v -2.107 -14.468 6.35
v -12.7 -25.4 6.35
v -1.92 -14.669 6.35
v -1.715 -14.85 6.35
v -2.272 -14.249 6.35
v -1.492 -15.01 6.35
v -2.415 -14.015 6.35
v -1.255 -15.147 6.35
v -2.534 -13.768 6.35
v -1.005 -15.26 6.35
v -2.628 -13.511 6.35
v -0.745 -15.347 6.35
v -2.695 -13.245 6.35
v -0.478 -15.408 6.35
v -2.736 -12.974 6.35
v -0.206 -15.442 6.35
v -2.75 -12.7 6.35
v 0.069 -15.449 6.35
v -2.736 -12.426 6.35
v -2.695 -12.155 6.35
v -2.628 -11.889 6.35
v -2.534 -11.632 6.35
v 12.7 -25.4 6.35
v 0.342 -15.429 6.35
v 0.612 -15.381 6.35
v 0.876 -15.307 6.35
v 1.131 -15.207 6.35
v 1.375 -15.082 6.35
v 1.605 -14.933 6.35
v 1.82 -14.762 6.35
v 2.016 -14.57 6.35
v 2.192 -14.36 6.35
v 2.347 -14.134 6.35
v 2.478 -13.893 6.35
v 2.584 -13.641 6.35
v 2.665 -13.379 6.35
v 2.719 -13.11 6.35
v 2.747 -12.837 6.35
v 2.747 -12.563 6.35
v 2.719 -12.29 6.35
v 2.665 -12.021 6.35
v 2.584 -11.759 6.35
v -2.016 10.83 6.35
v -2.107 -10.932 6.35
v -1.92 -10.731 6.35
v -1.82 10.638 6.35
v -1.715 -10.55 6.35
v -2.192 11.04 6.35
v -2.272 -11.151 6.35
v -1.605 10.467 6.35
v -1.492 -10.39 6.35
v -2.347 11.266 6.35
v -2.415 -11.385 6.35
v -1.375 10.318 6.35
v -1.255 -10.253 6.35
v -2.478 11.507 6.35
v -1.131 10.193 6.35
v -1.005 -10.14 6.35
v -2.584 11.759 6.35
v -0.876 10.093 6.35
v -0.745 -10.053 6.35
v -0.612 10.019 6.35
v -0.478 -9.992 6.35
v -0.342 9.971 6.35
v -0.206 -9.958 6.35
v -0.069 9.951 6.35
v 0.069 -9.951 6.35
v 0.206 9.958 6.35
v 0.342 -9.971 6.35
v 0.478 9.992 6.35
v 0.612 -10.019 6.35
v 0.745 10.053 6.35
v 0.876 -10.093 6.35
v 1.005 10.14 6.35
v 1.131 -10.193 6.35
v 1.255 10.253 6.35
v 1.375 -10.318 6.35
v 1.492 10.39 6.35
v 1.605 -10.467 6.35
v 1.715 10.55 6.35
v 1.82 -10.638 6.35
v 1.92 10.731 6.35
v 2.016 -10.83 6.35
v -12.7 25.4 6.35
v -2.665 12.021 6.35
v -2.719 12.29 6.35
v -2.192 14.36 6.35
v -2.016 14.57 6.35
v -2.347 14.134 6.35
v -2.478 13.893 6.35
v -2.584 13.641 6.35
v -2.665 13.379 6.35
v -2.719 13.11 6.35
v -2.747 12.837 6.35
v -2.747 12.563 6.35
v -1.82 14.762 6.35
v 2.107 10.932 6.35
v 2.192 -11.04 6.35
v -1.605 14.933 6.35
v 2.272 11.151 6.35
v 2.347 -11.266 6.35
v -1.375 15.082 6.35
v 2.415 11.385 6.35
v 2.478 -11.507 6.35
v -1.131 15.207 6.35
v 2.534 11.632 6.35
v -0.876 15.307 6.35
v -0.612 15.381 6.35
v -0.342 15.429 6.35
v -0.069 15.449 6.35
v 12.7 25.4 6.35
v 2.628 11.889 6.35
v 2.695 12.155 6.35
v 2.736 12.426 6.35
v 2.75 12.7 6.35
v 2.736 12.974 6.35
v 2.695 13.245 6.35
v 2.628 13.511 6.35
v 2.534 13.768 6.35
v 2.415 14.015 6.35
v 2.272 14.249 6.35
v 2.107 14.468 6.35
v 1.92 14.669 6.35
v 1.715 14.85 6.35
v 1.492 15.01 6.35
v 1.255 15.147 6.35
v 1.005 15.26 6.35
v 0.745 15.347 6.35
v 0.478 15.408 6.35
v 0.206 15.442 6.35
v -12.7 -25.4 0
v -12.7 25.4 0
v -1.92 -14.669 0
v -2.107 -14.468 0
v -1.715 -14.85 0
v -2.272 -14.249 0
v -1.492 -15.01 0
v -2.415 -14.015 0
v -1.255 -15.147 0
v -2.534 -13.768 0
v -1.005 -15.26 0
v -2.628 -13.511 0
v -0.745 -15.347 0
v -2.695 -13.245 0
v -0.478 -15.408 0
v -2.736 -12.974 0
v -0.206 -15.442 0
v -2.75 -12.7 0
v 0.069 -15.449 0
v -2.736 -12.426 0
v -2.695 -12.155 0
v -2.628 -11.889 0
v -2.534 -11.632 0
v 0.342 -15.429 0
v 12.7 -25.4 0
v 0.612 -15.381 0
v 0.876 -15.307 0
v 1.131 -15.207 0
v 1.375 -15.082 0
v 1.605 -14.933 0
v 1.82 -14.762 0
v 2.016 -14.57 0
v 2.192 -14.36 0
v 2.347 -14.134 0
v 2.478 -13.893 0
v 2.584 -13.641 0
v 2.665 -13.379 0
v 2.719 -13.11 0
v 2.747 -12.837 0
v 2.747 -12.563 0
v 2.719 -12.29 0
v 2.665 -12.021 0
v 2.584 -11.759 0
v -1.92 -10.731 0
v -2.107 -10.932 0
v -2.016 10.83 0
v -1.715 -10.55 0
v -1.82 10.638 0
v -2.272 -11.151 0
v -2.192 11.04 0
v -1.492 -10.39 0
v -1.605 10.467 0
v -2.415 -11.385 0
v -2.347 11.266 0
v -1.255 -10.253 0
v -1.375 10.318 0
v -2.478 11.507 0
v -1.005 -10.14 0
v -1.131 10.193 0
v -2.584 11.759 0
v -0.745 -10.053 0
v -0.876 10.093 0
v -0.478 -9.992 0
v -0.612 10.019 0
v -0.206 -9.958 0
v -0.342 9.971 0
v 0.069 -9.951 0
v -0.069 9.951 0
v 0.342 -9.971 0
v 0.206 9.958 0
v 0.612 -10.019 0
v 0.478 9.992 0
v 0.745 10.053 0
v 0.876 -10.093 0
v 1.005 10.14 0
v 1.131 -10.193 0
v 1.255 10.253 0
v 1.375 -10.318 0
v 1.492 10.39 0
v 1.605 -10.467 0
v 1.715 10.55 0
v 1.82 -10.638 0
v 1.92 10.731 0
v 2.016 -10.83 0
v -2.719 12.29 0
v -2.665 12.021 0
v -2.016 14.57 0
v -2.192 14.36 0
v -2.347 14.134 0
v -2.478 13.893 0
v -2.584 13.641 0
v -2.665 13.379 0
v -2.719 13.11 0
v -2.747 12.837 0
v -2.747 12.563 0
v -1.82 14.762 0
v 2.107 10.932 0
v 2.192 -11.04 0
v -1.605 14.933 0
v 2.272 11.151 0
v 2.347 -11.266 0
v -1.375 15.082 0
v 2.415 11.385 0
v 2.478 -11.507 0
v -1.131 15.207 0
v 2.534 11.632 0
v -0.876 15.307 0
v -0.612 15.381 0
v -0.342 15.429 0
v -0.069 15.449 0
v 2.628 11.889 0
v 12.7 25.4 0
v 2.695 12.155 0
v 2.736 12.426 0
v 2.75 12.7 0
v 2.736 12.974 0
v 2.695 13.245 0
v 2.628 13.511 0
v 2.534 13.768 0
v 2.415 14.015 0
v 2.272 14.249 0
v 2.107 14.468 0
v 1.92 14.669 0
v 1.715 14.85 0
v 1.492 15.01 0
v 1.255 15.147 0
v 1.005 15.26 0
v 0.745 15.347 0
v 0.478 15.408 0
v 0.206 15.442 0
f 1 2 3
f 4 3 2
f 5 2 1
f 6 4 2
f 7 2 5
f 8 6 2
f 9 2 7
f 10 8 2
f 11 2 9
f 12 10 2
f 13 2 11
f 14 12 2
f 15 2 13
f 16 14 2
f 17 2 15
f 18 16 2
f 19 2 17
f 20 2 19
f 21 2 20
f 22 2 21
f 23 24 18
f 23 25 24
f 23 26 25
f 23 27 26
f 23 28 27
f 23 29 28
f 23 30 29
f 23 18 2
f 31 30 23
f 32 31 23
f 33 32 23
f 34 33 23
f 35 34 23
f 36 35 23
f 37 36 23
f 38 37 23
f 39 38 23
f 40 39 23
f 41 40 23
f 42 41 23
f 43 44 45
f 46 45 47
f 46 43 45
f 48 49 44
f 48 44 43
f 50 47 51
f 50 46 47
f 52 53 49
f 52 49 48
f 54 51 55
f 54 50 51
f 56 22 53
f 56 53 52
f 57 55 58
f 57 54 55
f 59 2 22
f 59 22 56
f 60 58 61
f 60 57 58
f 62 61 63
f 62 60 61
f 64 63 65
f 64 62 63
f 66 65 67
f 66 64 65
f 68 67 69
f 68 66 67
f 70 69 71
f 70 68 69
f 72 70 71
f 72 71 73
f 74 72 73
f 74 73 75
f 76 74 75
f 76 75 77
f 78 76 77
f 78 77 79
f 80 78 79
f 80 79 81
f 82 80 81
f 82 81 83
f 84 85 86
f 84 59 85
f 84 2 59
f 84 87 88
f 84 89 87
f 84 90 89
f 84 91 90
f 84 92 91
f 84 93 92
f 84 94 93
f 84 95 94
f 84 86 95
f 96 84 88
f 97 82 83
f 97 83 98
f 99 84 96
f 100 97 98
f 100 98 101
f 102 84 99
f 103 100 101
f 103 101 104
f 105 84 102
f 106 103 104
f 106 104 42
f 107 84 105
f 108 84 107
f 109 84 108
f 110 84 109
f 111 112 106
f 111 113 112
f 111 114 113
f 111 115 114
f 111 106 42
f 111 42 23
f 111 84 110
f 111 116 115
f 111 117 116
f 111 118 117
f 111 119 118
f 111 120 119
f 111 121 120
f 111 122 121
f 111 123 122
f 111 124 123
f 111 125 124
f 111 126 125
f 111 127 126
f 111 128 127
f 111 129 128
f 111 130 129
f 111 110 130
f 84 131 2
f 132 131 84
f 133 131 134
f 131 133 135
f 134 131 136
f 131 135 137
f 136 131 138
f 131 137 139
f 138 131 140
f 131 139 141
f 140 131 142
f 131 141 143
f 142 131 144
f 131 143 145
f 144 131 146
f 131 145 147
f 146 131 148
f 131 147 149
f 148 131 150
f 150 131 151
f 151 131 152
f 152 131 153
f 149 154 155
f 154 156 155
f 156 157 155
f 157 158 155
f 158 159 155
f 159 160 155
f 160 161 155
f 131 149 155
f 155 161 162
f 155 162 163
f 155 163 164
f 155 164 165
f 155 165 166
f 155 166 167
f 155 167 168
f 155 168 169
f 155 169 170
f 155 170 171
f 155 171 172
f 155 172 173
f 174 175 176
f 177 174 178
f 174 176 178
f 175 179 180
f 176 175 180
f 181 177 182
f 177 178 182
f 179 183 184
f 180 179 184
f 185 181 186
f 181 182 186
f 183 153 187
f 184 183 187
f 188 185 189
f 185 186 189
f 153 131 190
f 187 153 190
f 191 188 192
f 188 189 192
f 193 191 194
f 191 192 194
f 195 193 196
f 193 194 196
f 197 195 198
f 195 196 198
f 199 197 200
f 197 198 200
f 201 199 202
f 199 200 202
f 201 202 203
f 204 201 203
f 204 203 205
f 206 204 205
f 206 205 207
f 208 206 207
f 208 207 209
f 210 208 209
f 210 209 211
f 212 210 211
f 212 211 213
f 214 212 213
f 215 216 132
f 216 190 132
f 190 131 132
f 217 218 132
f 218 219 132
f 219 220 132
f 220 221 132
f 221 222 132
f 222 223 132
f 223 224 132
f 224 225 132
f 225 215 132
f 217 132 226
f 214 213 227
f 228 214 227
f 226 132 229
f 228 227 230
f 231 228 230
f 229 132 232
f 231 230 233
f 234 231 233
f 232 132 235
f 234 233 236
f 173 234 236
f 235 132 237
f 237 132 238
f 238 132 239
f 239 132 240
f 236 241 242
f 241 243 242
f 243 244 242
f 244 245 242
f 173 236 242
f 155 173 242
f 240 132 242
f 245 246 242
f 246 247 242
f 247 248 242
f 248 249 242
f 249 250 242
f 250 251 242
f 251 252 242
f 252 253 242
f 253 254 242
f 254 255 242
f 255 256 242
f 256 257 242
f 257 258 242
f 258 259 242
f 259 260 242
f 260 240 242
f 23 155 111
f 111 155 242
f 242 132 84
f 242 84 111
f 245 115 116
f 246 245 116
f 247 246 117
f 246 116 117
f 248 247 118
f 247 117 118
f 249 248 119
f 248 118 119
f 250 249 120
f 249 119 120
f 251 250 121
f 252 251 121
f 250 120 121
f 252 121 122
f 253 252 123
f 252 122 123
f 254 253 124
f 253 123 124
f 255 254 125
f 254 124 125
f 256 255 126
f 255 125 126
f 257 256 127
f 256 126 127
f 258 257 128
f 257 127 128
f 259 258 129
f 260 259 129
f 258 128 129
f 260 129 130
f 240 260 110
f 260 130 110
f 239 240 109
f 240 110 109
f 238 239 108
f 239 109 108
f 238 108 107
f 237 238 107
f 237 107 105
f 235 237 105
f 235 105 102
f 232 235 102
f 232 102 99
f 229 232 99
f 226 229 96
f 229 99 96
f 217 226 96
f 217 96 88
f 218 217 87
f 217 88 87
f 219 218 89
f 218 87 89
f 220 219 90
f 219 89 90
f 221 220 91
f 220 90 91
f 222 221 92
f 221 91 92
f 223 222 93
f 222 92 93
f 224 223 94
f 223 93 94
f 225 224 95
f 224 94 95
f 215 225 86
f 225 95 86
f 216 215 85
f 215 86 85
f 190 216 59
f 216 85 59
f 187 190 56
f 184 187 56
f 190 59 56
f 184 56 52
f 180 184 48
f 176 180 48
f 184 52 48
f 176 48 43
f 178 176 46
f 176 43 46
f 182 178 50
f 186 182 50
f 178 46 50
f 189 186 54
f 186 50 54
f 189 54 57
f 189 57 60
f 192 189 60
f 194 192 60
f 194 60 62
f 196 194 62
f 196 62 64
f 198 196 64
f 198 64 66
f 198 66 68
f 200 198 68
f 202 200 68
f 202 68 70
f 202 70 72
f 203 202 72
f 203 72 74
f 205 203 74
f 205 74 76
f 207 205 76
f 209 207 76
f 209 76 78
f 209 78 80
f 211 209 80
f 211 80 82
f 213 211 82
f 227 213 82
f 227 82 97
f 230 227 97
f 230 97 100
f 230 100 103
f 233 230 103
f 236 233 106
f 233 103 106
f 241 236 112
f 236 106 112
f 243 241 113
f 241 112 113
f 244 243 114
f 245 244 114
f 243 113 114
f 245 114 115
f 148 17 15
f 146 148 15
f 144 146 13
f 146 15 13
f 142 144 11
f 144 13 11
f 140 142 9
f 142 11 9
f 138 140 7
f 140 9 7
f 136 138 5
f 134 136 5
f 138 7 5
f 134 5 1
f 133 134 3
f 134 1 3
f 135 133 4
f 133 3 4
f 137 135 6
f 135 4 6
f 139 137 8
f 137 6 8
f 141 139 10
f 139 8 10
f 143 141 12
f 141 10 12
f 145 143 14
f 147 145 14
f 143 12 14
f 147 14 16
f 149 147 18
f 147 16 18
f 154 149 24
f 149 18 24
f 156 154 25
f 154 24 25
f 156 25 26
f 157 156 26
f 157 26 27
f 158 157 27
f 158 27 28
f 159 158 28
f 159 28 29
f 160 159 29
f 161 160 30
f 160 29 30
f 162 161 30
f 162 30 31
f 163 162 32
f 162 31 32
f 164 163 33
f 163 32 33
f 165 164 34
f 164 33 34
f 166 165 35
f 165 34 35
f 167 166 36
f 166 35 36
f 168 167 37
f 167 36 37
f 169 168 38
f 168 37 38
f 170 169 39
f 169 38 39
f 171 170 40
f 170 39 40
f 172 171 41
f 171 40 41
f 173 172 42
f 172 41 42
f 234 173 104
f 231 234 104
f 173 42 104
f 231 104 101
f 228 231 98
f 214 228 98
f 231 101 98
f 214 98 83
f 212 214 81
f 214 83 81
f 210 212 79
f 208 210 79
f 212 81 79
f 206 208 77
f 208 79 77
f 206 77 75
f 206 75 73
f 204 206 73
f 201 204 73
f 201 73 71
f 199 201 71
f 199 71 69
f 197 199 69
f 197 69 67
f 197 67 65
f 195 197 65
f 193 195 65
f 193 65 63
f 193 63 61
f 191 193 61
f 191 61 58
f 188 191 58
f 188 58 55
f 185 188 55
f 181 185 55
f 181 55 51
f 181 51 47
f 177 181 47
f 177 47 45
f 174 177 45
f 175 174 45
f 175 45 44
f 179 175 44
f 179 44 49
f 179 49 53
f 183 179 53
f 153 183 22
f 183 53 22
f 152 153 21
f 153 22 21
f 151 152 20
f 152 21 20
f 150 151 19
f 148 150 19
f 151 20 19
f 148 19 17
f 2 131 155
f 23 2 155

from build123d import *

# Parameters (mm, degrees)
ESQUISSE1_W             = 25.4
ESQUISSE1_H             = 50.8
BOSS_EXTRU_1_DEPTH      = 6.35
ESQUISSE2_R             = 2.75
ENL_V_MAT_EXTRU_1_DEPTH = 6.35


with BuildPart() as part:
    # Esquisse1 → Boss.-Extru.1 (new body)
    with BuildSketch(Plane.XY):
        Rectangle(ESQUISSE1_W, ESQUISSE1_H)
    extrude(amount=BOSS_EXTRU_1_DEPTH)

    # Esquisse2 → Enlèv. mat.-Extru.1 (cut)
    with BuildSketch(Plane.XY.offset(6.35)):
        with Locations((0, 12.7)):
            Circle(ESQUISSE2_R)
        with Locations(Location((0, -12.7, 0), (0, 0, 180))):
            Circle(ESQUISSE2_R)
    extrude(amount=-ENL_V_MAT_EXTRU_1_DEPTH, mode=Mode.SUBTRACT)


solid = part.part
